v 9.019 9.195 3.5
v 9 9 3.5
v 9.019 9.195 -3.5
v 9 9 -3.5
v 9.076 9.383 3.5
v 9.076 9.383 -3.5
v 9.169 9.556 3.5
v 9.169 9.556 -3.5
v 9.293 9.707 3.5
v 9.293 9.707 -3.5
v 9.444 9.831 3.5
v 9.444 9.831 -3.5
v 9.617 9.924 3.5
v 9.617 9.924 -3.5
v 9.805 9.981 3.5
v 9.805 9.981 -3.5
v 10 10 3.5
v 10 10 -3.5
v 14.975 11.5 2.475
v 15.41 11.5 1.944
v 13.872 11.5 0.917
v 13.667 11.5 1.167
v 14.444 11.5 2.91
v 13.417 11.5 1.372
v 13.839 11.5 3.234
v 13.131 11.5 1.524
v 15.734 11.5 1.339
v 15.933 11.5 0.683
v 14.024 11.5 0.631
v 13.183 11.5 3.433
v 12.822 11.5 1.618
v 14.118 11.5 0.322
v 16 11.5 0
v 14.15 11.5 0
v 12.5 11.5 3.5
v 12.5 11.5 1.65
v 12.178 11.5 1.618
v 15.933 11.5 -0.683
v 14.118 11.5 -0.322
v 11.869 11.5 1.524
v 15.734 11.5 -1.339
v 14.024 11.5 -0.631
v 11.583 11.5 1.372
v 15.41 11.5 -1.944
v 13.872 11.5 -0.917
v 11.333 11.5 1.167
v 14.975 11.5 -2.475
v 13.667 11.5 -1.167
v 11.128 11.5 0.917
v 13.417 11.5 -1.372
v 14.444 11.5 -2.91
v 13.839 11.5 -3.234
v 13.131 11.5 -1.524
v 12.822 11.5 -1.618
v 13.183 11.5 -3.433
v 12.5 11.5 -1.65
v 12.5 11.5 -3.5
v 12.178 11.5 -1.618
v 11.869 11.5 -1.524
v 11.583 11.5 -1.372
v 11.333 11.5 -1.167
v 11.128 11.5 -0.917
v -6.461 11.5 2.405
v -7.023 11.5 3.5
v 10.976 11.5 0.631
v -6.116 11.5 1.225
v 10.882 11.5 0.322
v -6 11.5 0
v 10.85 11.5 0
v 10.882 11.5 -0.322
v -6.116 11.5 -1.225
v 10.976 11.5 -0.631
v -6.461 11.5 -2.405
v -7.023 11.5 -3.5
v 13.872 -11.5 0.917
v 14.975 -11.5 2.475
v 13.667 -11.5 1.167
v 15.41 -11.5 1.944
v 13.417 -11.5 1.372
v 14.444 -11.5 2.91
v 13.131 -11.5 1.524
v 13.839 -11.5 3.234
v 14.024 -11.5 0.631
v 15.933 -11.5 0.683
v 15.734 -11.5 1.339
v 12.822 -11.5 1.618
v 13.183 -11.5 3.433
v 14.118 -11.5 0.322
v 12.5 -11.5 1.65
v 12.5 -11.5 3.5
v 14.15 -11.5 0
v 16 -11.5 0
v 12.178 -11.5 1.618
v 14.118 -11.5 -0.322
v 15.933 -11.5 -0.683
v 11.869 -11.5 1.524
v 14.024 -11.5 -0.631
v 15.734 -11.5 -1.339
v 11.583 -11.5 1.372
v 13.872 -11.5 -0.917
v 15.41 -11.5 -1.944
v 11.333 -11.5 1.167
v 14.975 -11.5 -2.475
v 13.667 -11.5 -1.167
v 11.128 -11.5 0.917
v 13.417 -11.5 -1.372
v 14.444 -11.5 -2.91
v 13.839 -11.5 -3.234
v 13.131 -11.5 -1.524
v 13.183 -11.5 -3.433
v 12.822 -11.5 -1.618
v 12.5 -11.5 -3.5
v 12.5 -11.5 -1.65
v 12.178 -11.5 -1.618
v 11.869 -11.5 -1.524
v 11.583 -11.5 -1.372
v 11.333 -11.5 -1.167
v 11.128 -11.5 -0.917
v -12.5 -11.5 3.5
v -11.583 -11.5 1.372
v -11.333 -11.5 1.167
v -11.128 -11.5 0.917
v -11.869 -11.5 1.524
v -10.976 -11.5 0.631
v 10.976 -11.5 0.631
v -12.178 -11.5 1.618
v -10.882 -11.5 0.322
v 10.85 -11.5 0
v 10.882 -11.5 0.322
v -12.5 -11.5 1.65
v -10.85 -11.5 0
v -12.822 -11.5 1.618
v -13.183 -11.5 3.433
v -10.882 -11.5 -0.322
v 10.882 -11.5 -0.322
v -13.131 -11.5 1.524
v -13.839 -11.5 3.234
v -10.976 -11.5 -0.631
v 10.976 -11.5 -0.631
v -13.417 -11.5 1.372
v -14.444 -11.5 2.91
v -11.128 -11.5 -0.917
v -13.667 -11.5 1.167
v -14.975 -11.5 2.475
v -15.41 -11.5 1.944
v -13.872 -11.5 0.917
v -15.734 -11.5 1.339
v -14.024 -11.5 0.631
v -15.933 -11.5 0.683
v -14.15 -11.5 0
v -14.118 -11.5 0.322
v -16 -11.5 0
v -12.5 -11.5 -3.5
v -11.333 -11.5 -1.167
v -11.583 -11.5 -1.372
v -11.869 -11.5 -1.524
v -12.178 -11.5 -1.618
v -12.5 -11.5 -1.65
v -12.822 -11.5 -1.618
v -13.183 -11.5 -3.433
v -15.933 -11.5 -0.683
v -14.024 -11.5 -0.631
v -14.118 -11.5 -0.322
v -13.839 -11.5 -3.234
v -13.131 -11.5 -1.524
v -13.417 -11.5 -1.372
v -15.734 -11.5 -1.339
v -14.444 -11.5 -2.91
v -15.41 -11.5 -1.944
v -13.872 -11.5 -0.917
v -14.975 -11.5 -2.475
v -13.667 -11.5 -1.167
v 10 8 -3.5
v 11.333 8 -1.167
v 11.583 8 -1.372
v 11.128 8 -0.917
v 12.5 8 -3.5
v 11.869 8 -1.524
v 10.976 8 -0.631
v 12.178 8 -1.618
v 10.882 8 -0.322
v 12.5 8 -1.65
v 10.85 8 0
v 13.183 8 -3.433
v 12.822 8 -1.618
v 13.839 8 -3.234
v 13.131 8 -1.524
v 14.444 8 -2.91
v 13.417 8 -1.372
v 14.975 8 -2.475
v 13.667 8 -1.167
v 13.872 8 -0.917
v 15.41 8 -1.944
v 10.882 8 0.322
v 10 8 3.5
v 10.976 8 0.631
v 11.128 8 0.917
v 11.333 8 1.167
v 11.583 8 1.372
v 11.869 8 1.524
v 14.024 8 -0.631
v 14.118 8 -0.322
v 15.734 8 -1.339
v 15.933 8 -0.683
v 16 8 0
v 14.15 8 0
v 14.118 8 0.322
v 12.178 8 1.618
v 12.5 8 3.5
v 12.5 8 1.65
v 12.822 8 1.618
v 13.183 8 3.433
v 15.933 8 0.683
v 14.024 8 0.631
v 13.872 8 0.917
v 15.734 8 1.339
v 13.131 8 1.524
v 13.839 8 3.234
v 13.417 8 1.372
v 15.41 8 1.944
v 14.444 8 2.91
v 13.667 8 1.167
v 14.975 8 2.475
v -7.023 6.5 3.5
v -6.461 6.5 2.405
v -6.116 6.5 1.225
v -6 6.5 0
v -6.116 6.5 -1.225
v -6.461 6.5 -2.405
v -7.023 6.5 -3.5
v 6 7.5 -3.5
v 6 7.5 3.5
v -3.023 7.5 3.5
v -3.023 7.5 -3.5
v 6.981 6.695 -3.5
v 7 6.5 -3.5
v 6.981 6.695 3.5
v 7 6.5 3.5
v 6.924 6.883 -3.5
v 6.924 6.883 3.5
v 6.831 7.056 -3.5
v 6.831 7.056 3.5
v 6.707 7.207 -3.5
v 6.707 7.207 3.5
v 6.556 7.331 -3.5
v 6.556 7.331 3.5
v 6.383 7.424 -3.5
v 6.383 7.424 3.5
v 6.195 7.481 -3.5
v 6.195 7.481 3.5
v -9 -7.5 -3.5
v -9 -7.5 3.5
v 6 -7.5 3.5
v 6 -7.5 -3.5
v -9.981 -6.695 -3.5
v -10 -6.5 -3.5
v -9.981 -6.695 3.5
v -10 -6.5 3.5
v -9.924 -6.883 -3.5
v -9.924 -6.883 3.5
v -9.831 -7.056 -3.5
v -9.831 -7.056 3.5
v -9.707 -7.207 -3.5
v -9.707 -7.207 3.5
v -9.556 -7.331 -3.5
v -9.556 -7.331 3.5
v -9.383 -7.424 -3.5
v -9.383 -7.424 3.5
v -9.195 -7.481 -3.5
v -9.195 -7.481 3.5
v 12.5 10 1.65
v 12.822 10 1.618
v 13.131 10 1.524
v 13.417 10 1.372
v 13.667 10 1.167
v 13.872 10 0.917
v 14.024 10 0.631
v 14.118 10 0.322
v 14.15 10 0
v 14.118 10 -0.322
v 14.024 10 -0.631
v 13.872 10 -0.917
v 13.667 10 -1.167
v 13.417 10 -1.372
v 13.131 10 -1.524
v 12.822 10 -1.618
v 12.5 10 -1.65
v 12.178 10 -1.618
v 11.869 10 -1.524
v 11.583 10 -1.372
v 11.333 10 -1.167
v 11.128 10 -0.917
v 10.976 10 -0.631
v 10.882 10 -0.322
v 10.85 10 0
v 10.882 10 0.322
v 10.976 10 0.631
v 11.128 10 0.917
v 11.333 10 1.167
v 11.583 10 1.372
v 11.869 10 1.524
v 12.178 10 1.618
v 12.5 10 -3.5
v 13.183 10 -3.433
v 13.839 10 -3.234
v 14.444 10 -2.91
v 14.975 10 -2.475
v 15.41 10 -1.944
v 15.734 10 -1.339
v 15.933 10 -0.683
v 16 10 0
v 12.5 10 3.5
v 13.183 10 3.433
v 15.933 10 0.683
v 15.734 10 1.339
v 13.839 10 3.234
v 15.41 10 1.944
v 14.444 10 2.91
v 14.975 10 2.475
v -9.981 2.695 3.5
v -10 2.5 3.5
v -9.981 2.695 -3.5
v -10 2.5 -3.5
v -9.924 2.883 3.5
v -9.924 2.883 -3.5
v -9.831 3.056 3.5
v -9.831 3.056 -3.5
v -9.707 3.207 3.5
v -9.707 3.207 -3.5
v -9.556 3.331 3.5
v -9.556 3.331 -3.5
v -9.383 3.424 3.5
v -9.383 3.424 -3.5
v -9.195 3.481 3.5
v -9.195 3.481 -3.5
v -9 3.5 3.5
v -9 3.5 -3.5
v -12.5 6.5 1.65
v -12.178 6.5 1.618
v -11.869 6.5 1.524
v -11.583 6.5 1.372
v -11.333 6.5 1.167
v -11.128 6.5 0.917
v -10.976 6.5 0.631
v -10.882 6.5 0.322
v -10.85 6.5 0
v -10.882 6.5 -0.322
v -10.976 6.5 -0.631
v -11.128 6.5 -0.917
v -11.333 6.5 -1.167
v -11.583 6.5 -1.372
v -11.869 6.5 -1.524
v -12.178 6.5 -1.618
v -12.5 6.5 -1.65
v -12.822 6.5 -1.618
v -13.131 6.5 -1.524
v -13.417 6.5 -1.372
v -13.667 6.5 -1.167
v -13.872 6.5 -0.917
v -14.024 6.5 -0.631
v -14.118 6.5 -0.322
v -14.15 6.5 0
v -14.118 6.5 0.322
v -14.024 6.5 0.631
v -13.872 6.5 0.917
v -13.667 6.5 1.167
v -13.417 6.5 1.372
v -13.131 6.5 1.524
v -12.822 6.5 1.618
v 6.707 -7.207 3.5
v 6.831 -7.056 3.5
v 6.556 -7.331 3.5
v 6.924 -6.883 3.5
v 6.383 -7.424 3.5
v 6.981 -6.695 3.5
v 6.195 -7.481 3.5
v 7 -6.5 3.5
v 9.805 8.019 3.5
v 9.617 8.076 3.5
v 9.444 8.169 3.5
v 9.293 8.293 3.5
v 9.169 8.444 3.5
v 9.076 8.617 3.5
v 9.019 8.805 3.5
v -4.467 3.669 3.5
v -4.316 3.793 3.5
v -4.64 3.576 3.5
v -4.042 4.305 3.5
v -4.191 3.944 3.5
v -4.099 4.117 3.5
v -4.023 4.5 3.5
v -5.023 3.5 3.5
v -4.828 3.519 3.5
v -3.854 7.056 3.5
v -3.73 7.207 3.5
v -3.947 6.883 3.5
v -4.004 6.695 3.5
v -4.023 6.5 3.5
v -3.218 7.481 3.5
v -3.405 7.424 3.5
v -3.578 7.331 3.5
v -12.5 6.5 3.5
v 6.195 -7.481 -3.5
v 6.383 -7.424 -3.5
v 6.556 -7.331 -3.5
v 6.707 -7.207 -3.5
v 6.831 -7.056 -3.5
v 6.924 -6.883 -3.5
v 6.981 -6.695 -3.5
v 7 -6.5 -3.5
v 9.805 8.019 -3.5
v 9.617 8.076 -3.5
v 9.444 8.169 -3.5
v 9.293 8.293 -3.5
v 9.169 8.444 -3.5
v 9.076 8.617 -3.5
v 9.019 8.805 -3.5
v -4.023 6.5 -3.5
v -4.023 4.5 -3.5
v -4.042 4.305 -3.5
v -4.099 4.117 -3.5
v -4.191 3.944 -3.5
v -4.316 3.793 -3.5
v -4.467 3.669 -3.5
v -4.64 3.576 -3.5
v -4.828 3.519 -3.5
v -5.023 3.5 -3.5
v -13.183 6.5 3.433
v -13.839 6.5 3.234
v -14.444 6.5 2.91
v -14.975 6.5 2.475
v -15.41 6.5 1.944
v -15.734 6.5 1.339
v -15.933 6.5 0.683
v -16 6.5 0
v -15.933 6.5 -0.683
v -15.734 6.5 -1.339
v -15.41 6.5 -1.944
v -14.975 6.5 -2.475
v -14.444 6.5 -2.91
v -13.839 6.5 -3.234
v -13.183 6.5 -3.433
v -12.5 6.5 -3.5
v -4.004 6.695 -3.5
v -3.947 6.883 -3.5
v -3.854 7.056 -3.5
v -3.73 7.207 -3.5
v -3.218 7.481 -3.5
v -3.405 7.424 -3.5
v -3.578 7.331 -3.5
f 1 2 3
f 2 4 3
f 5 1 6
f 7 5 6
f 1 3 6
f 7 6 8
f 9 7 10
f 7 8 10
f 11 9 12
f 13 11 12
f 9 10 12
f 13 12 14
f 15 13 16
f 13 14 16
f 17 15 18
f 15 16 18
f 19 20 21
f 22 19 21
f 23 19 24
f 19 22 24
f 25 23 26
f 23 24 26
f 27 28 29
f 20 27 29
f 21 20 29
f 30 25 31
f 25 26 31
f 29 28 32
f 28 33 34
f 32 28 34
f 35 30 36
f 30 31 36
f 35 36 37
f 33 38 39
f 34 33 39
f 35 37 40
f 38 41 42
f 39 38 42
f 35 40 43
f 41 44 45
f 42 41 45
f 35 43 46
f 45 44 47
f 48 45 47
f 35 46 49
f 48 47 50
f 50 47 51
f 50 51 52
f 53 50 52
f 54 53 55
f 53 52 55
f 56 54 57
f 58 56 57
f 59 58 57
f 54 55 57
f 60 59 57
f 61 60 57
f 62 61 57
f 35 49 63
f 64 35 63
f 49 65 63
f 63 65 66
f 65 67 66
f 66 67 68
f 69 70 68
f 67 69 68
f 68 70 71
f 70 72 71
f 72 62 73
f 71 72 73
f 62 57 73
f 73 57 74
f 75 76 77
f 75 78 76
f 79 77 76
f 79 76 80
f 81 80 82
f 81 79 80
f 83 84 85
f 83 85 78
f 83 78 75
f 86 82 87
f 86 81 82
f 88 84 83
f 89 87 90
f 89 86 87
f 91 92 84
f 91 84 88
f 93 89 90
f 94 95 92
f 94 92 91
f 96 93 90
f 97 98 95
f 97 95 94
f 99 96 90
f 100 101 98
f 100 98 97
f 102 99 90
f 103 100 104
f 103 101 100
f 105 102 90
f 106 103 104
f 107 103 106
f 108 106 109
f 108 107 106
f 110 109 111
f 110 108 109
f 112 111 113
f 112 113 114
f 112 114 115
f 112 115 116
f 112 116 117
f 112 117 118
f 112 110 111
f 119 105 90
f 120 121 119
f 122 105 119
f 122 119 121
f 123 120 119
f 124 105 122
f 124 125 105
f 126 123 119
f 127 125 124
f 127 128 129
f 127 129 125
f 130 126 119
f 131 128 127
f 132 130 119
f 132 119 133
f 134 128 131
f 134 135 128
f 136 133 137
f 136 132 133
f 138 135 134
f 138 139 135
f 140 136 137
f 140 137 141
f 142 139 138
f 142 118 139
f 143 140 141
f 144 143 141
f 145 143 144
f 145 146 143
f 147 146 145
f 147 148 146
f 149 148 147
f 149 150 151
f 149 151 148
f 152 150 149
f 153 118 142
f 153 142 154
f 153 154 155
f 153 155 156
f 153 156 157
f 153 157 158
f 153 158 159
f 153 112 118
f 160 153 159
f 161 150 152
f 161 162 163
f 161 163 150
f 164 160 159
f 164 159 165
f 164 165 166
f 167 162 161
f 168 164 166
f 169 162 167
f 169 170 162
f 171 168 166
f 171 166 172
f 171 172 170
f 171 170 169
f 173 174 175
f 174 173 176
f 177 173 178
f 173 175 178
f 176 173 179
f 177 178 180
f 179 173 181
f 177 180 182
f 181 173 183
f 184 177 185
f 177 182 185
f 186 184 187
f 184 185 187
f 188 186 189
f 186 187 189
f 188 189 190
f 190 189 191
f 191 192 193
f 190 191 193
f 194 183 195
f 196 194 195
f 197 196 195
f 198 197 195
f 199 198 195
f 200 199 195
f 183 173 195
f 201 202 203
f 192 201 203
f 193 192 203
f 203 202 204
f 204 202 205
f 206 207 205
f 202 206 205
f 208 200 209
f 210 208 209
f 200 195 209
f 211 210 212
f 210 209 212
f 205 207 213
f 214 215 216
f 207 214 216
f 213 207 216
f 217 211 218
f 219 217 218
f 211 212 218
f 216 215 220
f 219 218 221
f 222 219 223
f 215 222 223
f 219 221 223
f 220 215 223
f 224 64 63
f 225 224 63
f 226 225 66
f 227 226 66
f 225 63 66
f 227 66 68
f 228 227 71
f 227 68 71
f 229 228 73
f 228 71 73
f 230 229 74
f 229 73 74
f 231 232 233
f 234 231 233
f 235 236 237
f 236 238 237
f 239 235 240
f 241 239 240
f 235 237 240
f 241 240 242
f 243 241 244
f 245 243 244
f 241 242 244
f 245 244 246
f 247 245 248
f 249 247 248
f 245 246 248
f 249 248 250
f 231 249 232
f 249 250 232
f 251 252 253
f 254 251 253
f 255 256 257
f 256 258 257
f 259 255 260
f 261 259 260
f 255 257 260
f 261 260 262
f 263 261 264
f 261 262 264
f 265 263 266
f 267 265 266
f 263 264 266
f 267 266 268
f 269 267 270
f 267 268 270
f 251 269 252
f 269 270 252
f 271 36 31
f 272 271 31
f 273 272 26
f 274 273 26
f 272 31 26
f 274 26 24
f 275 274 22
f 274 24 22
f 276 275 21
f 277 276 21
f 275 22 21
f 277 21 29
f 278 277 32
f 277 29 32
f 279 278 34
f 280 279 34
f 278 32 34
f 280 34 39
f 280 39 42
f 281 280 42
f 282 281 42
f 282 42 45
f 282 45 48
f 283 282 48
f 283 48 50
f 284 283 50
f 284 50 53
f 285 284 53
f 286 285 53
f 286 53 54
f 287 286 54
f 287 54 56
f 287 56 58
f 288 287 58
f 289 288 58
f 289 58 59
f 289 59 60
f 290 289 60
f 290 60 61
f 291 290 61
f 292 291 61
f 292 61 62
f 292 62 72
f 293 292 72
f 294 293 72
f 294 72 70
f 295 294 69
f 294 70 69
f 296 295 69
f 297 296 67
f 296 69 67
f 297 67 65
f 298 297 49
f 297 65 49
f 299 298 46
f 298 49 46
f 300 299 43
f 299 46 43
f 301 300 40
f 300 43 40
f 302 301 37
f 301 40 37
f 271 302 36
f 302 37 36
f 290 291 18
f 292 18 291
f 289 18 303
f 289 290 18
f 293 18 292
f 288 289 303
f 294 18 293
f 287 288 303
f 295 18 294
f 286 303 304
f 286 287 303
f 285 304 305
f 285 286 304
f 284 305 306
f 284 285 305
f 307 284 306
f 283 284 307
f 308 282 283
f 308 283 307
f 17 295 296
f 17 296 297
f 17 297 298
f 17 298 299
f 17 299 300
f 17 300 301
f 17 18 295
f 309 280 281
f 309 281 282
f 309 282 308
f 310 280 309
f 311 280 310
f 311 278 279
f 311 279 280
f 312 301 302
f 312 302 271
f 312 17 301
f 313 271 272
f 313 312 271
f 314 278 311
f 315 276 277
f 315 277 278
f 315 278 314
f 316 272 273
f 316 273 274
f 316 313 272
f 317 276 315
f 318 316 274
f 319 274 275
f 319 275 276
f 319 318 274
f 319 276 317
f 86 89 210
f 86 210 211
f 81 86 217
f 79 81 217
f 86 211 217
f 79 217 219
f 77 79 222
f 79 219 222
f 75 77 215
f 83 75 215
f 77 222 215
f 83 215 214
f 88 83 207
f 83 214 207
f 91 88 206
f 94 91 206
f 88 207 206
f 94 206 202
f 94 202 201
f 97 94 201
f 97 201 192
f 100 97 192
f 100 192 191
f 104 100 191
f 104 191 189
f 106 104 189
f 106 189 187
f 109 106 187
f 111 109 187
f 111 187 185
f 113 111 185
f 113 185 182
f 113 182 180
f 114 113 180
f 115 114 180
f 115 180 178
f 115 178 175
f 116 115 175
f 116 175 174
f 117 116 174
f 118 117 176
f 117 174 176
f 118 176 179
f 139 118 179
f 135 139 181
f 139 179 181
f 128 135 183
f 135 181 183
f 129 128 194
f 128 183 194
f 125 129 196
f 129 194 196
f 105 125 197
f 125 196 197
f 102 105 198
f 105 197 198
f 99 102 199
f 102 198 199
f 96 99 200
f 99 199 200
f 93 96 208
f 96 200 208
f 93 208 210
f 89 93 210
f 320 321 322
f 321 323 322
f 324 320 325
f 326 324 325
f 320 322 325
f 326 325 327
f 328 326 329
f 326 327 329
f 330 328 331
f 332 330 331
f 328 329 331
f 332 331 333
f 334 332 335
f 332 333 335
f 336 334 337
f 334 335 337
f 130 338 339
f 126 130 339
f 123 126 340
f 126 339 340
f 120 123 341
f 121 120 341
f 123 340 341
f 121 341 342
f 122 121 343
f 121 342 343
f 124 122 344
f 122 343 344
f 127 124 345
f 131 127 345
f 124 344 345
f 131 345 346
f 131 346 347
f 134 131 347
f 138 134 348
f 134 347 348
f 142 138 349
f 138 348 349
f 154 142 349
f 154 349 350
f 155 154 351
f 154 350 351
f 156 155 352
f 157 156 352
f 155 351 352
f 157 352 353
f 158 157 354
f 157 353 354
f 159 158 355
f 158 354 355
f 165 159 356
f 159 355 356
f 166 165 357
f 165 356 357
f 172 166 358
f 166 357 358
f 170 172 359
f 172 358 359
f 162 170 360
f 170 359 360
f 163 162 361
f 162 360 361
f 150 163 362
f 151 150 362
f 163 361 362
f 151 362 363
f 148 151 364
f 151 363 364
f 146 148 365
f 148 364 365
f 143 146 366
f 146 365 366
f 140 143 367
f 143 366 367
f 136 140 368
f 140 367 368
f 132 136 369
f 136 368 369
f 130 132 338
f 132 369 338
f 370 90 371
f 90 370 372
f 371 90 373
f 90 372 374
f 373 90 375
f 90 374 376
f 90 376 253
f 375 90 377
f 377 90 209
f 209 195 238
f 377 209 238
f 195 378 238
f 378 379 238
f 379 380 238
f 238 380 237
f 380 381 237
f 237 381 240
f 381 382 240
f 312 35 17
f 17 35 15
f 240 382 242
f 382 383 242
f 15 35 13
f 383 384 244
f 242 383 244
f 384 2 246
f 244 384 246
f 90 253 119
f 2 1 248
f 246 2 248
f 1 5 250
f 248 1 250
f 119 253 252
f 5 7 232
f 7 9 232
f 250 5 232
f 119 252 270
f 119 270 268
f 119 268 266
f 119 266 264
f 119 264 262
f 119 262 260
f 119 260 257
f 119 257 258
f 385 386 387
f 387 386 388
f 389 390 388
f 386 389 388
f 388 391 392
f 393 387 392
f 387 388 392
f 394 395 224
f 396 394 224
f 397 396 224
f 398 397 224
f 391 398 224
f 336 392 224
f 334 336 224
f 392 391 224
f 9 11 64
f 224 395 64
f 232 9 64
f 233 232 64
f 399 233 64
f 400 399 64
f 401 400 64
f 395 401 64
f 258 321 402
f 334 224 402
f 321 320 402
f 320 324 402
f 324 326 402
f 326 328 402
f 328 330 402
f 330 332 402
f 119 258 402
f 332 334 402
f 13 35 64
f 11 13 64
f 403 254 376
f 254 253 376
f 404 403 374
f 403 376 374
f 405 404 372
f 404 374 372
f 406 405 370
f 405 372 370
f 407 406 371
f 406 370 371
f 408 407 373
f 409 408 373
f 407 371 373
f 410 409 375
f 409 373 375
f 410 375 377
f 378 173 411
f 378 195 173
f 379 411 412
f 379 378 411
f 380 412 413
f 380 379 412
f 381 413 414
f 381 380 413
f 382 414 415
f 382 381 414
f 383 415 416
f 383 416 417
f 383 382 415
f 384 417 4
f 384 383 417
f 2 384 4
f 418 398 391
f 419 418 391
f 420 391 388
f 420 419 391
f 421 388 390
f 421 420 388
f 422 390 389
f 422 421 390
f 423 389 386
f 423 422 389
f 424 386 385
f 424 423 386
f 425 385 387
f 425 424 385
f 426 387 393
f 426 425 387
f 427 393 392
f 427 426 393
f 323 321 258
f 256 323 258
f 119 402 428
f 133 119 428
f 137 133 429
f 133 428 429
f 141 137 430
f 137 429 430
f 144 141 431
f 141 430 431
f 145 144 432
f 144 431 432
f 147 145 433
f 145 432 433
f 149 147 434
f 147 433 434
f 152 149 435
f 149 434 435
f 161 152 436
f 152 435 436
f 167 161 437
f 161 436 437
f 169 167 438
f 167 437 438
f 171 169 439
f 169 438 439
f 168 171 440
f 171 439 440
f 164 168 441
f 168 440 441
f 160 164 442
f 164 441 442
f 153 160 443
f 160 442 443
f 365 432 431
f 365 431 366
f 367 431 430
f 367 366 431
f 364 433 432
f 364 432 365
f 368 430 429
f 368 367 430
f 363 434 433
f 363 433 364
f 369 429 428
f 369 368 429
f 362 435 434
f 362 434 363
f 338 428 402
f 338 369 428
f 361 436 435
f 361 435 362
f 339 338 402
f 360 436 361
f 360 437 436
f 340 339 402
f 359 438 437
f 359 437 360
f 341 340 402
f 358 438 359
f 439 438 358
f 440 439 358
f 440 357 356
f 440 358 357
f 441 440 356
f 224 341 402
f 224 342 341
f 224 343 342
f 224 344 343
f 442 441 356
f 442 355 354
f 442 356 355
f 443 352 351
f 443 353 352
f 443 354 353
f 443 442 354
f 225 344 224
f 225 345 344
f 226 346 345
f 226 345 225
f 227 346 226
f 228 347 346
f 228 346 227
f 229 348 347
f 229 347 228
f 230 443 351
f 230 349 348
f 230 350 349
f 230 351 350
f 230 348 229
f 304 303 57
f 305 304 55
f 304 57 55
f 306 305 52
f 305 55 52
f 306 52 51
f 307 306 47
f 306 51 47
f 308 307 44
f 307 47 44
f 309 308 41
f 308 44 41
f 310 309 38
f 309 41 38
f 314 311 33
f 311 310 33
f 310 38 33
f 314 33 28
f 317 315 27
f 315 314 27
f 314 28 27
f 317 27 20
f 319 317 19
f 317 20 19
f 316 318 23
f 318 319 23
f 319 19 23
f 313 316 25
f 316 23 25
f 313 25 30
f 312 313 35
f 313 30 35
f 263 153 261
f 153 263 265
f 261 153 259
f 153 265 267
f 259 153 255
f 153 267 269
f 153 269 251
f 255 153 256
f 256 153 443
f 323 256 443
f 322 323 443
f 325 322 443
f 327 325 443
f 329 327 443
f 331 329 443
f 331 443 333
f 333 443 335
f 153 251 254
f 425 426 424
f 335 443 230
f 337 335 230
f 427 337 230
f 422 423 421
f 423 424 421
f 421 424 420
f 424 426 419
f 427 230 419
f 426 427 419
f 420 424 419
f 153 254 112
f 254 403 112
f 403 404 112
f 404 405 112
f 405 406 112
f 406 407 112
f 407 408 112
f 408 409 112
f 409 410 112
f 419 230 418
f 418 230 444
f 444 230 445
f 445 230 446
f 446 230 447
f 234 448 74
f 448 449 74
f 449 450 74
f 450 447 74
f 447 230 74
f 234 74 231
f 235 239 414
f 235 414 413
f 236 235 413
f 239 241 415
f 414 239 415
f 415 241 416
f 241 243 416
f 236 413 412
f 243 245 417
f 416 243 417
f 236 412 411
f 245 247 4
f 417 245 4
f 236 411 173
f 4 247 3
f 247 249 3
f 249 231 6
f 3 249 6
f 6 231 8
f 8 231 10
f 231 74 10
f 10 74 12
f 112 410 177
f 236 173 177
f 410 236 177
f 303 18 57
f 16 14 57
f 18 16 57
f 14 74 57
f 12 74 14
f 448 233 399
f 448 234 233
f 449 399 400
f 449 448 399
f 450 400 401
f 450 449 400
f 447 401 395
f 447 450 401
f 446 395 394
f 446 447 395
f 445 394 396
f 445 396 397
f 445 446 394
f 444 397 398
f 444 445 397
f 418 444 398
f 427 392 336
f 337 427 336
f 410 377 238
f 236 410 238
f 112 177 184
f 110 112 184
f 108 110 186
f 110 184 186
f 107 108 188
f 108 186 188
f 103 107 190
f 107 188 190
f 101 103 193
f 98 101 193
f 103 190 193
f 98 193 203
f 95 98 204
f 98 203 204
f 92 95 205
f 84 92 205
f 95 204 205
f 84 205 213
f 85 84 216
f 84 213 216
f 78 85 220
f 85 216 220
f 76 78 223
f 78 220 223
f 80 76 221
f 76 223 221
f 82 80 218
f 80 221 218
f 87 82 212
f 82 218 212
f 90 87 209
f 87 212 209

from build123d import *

# Parameters (mm, degrees)
EXTRUDE_1_DEPTH     = 11.5
SKETCH_2_R          = 1.65
CUT_EXTRUDE_1_DEPTH = 46.5
SKETCH_4_R          = 6.5
CUT_EXTRUDE_2_DEPTH = 5
SKETCH_5_W          = 7
SKETCH_5_H          = 2
CUT_EXTRUDE_3_DEPTH = 10
FILLET_1_R          = 1
CUT_EXTRUDE_4_DEPTH = 25
FILLET_2_R          = 1


with BuildPart() as part:
    # 草图1 → 凸台-拉伸1 (new, symmetric)
    with BuildSketch(Plane(origin=(0, 0, 0), x_dir=(1, 0, 0), z_dir=(0, 1, 0))):
        with BuildLine():
            Line((-12.5, 3.5), (12.5, 3.5))
            ThreePointArc((12.5, 3.5), (16, 0), (12.5, -3.5))
            Line((12.5, -3.5), (-12.5, -3.5))
            ThreePointArc((-12.5, -3.5), (-16, 0), (-12.5, 3.5))
        make_face()
    extrude(amount=EXTRUDE_1_DEPTH, both=True)

    # 草图2 → 切除-拉伸1 (cut, symmetric)
    with BuildSketch(Plane(origin=(0, 11.5, 0), x_dir=(1, 0, 0), z_dir=(0, 1, 0))):
        with Locations(Location((12.5, 0, 0), (0, 0, 270))):
            Circle(SKETCH_2_R)
        with Locations(Location((-12.5, 0, 0), (0, 0, 270))):
            Circle(SKETCH_2_R)
    extrude(amount=CUT_EXTRUDE_1_DEPTH, both=True, mode=Mode.SUBTRACT)

    # 草图4 → 切除-拉伸2 (cut, symmetric)
    with BuildSketch(Plane(origin=(0, 11.5, 0), x_dir=(1, 0, 0), z_dir=(0, 1, 0))):
        with Locations((-12.5, 0)):
            Circle(SKETCH_4_R)
    extrude(amount=CUT_EXTRUDE_2_DEPTH, both=True, mode=Mode.SUBTRACT)

    # 草图5 → 切除-拉伸3 (cut, symmetric)
    with BuildSketch(Plane.XY.offset(3.5)):
        with Locations((12.5, 9)):
            Rectangle(SKETCH_5_W, SKETCH_5_H)
    extrude(amount=CUT_EXTRUDE_3_DEPTH, both=True, mode=Mode.SUBTRACT)

    # 圆角1
    fillet_1_edges = [part.edges().sort_by_distance(p)[0] for p in [
        (9, 8, 0),
        (9, 10, 0),
    ]]
    fillet(fillet_1_edges, radius=FILLET_1_R - 0.0001)  # a hair under: the kernel refuses the full size

    # 草图6 → 切除-拉伸4 (cut, symmetric)
    with BuildSketch(Plane.XY.offset(3.5)):
        Polygon((-10, 3.5), (-10, -7.5), (7, -7.5), (7, 7.5), (-4.022774425, 7.5), (-4.022774425, 3.5), align=None)
    extrude(amount=CUT_EXTRUDE_4_DEPTH, both=True, mode=Mode.SUBTRACT)

    # 圆角2
    fillet_2_edges = [part.edges().sort_by_distance(p)[0] for p in [
        (-10, 3.5, 0),
        (-4.022774425, 3.5, 0),
        (-4.022774425, 7.5, 0),
        (7, 7.5, 0),
        (7, -7.5, 0),
        (-10, -7.5, 0),
    ]]
    fillet(fillet_2_edges, radius=FILLET_2_R)


solid = part.part
